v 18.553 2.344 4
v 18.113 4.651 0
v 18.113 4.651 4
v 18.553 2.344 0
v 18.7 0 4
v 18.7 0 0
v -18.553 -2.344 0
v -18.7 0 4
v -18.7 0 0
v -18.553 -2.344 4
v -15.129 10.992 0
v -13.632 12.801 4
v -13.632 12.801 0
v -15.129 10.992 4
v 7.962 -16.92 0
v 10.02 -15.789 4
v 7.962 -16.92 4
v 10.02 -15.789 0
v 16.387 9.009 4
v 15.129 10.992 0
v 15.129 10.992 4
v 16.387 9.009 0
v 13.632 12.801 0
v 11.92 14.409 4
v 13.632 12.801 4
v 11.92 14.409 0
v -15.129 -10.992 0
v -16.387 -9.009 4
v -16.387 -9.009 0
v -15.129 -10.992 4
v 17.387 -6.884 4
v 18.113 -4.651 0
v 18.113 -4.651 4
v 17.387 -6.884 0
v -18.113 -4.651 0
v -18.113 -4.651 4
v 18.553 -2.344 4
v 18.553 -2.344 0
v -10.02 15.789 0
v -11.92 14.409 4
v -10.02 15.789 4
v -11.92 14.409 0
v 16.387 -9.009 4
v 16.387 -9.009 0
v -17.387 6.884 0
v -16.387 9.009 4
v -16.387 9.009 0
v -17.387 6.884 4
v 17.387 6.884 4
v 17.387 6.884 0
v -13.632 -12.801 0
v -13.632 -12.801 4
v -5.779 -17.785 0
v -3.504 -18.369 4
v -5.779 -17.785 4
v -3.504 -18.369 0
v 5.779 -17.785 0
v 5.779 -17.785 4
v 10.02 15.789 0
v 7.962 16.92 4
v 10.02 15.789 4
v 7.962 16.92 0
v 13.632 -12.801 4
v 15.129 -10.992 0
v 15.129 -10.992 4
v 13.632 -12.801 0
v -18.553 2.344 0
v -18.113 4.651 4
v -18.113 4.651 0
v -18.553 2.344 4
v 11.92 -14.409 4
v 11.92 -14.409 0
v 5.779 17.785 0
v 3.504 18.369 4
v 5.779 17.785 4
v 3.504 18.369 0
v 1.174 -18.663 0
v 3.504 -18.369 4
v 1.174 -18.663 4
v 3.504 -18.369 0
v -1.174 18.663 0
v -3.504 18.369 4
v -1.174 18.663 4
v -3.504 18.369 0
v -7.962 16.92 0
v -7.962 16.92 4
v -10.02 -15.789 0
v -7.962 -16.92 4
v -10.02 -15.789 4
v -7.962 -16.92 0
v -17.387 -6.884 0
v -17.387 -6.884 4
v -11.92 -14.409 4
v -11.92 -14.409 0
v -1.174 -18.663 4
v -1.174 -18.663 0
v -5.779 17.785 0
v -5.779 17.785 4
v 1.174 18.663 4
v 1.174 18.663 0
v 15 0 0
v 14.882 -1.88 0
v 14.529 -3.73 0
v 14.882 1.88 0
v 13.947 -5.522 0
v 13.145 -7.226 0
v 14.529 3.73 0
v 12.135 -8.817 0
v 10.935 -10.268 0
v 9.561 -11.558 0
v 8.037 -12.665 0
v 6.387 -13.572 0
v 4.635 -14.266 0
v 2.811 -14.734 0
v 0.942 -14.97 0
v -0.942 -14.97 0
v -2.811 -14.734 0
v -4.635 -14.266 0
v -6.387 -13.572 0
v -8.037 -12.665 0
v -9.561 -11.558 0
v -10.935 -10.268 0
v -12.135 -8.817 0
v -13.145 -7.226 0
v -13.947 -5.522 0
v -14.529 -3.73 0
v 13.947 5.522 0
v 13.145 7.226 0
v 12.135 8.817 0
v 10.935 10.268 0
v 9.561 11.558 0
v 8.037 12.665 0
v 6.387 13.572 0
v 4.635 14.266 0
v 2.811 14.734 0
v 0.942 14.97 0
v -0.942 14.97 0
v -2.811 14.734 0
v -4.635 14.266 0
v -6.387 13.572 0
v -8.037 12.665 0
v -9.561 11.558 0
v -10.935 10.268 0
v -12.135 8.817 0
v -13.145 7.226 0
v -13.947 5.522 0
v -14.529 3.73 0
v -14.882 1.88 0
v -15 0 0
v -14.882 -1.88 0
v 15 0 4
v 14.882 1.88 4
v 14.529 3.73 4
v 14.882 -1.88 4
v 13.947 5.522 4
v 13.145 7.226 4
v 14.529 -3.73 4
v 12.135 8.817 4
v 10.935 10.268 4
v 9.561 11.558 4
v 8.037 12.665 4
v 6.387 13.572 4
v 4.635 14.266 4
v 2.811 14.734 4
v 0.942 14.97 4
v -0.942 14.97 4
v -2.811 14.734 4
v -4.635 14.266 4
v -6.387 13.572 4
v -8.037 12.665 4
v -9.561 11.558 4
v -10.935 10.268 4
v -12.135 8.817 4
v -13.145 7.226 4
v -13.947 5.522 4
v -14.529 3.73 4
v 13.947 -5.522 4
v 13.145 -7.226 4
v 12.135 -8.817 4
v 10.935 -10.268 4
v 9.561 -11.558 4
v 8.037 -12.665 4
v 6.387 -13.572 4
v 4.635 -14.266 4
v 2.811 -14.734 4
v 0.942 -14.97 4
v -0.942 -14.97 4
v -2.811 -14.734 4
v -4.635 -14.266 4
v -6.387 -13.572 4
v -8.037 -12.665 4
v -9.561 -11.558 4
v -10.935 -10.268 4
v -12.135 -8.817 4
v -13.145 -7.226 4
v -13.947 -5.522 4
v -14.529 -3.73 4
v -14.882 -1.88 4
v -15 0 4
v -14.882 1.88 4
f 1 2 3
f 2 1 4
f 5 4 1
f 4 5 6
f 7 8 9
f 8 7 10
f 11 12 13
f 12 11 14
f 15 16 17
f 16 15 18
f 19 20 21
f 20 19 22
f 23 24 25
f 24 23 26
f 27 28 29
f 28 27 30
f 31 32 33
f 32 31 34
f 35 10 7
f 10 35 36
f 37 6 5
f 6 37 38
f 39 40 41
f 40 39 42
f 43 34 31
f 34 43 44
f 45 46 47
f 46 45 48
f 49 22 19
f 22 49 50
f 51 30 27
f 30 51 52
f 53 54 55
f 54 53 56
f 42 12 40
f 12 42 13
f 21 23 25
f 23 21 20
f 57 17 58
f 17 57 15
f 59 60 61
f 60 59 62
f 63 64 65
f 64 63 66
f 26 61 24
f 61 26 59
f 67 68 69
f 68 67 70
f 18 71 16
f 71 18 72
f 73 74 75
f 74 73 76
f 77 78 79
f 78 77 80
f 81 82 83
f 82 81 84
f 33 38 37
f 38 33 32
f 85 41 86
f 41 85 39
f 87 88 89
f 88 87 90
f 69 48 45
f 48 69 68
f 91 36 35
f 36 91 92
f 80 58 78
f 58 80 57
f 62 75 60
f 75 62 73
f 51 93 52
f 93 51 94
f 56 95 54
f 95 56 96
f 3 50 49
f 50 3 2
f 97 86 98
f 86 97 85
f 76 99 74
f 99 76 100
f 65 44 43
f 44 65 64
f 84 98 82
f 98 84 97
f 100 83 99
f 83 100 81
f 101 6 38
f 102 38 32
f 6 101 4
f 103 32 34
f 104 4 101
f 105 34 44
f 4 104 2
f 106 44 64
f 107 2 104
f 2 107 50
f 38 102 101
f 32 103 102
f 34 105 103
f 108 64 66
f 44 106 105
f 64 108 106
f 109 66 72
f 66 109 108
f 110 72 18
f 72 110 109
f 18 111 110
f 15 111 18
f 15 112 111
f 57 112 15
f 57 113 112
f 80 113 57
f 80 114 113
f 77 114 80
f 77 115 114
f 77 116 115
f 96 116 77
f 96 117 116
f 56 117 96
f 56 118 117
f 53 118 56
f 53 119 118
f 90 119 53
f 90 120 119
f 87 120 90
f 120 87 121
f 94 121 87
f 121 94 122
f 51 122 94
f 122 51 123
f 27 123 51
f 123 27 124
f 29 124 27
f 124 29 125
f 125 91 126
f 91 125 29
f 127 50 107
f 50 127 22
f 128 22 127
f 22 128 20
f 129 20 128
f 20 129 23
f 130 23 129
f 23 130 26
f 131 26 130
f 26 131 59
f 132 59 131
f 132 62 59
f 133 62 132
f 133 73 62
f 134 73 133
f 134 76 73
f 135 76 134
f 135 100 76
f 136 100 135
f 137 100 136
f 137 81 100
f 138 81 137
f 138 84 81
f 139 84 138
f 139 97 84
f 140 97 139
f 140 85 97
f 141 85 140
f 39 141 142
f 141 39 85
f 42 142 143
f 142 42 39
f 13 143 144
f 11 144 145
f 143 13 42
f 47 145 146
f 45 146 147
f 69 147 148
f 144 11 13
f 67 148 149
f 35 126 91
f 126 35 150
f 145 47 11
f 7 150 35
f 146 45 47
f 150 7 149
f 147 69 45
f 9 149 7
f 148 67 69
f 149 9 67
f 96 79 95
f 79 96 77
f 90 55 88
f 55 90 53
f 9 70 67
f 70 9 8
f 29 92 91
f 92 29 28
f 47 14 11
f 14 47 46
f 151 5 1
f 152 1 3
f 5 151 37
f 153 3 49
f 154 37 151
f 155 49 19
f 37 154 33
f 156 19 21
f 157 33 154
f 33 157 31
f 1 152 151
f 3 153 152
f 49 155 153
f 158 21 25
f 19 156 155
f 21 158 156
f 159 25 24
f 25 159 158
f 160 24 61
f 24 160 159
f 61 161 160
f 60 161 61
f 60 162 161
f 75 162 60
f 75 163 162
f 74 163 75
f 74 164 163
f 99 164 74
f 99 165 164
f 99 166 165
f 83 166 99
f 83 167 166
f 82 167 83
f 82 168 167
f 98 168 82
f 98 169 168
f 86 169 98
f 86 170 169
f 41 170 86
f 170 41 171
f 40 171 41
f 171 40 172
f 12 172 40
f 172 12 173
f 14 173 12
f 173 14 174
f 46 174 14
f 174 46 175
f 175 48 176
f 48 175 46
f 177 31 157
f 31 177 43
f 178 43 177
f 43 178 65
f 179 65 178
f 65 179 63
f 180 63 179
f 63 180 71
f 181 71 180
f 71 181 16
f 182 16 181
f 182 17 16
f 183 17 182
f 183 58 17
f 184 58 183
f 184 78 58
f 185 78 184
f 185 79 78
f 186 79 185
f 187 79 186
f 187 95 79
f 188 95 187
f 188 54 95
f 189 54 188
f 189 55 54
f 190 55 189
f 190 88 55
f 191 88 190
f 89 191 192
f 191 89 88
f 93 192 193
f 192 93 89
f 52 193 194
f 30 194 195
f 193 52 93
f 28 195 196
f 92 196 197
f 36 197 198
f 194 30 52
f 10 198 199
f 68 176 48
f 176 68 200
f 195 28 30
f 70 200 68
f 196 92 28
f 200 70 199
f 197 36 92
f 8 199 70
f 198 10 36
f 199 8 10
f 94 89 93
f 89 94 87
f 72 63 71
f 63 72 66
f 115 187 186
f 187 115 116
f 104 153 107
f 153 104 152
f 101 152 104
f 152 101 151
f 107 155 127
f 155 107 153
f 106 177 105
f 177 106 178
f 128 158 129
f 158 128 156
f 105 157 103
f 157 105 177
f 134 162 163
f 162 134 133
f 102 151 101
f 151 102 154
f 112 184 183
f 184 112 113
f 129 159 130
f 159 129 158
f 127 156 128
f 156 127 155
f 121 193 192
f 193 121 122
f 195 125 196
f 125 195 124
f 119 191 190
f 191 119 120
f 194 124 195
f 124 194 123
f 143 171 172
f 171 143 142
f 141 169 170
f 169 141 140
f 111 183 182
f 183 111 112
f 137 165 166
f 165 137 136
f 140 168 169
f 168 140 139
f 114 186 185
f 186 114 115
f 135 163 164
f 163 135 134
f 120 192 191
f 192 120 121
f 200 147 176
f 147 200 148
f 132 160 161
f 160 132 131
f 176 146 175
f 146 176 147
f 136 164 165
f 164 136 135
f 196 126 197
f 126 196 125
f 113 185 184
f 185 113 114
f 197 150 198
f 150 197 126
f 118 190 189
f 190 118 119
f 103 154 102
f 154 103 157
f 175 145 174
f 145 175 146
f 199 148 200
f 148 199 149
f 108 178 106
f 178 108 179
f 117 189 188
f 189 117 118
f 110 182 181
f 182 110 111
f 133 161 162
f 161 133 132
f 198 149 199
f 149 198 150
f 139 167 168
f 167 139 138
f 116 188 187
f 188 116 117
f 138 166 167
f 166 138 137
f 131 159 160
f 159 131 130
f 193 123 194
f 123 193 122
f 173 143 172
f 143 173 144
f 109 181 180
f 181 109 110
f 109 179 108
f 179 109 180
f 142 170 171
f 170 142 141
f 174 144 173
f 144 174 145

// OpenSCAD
$fn = 50;


difference() {
	union() {
		cylinder(h = 4, r = 18.7000000000);
	}
	union() {
		cylinder(h = 4, r = 15.0000000000);
	}
}
